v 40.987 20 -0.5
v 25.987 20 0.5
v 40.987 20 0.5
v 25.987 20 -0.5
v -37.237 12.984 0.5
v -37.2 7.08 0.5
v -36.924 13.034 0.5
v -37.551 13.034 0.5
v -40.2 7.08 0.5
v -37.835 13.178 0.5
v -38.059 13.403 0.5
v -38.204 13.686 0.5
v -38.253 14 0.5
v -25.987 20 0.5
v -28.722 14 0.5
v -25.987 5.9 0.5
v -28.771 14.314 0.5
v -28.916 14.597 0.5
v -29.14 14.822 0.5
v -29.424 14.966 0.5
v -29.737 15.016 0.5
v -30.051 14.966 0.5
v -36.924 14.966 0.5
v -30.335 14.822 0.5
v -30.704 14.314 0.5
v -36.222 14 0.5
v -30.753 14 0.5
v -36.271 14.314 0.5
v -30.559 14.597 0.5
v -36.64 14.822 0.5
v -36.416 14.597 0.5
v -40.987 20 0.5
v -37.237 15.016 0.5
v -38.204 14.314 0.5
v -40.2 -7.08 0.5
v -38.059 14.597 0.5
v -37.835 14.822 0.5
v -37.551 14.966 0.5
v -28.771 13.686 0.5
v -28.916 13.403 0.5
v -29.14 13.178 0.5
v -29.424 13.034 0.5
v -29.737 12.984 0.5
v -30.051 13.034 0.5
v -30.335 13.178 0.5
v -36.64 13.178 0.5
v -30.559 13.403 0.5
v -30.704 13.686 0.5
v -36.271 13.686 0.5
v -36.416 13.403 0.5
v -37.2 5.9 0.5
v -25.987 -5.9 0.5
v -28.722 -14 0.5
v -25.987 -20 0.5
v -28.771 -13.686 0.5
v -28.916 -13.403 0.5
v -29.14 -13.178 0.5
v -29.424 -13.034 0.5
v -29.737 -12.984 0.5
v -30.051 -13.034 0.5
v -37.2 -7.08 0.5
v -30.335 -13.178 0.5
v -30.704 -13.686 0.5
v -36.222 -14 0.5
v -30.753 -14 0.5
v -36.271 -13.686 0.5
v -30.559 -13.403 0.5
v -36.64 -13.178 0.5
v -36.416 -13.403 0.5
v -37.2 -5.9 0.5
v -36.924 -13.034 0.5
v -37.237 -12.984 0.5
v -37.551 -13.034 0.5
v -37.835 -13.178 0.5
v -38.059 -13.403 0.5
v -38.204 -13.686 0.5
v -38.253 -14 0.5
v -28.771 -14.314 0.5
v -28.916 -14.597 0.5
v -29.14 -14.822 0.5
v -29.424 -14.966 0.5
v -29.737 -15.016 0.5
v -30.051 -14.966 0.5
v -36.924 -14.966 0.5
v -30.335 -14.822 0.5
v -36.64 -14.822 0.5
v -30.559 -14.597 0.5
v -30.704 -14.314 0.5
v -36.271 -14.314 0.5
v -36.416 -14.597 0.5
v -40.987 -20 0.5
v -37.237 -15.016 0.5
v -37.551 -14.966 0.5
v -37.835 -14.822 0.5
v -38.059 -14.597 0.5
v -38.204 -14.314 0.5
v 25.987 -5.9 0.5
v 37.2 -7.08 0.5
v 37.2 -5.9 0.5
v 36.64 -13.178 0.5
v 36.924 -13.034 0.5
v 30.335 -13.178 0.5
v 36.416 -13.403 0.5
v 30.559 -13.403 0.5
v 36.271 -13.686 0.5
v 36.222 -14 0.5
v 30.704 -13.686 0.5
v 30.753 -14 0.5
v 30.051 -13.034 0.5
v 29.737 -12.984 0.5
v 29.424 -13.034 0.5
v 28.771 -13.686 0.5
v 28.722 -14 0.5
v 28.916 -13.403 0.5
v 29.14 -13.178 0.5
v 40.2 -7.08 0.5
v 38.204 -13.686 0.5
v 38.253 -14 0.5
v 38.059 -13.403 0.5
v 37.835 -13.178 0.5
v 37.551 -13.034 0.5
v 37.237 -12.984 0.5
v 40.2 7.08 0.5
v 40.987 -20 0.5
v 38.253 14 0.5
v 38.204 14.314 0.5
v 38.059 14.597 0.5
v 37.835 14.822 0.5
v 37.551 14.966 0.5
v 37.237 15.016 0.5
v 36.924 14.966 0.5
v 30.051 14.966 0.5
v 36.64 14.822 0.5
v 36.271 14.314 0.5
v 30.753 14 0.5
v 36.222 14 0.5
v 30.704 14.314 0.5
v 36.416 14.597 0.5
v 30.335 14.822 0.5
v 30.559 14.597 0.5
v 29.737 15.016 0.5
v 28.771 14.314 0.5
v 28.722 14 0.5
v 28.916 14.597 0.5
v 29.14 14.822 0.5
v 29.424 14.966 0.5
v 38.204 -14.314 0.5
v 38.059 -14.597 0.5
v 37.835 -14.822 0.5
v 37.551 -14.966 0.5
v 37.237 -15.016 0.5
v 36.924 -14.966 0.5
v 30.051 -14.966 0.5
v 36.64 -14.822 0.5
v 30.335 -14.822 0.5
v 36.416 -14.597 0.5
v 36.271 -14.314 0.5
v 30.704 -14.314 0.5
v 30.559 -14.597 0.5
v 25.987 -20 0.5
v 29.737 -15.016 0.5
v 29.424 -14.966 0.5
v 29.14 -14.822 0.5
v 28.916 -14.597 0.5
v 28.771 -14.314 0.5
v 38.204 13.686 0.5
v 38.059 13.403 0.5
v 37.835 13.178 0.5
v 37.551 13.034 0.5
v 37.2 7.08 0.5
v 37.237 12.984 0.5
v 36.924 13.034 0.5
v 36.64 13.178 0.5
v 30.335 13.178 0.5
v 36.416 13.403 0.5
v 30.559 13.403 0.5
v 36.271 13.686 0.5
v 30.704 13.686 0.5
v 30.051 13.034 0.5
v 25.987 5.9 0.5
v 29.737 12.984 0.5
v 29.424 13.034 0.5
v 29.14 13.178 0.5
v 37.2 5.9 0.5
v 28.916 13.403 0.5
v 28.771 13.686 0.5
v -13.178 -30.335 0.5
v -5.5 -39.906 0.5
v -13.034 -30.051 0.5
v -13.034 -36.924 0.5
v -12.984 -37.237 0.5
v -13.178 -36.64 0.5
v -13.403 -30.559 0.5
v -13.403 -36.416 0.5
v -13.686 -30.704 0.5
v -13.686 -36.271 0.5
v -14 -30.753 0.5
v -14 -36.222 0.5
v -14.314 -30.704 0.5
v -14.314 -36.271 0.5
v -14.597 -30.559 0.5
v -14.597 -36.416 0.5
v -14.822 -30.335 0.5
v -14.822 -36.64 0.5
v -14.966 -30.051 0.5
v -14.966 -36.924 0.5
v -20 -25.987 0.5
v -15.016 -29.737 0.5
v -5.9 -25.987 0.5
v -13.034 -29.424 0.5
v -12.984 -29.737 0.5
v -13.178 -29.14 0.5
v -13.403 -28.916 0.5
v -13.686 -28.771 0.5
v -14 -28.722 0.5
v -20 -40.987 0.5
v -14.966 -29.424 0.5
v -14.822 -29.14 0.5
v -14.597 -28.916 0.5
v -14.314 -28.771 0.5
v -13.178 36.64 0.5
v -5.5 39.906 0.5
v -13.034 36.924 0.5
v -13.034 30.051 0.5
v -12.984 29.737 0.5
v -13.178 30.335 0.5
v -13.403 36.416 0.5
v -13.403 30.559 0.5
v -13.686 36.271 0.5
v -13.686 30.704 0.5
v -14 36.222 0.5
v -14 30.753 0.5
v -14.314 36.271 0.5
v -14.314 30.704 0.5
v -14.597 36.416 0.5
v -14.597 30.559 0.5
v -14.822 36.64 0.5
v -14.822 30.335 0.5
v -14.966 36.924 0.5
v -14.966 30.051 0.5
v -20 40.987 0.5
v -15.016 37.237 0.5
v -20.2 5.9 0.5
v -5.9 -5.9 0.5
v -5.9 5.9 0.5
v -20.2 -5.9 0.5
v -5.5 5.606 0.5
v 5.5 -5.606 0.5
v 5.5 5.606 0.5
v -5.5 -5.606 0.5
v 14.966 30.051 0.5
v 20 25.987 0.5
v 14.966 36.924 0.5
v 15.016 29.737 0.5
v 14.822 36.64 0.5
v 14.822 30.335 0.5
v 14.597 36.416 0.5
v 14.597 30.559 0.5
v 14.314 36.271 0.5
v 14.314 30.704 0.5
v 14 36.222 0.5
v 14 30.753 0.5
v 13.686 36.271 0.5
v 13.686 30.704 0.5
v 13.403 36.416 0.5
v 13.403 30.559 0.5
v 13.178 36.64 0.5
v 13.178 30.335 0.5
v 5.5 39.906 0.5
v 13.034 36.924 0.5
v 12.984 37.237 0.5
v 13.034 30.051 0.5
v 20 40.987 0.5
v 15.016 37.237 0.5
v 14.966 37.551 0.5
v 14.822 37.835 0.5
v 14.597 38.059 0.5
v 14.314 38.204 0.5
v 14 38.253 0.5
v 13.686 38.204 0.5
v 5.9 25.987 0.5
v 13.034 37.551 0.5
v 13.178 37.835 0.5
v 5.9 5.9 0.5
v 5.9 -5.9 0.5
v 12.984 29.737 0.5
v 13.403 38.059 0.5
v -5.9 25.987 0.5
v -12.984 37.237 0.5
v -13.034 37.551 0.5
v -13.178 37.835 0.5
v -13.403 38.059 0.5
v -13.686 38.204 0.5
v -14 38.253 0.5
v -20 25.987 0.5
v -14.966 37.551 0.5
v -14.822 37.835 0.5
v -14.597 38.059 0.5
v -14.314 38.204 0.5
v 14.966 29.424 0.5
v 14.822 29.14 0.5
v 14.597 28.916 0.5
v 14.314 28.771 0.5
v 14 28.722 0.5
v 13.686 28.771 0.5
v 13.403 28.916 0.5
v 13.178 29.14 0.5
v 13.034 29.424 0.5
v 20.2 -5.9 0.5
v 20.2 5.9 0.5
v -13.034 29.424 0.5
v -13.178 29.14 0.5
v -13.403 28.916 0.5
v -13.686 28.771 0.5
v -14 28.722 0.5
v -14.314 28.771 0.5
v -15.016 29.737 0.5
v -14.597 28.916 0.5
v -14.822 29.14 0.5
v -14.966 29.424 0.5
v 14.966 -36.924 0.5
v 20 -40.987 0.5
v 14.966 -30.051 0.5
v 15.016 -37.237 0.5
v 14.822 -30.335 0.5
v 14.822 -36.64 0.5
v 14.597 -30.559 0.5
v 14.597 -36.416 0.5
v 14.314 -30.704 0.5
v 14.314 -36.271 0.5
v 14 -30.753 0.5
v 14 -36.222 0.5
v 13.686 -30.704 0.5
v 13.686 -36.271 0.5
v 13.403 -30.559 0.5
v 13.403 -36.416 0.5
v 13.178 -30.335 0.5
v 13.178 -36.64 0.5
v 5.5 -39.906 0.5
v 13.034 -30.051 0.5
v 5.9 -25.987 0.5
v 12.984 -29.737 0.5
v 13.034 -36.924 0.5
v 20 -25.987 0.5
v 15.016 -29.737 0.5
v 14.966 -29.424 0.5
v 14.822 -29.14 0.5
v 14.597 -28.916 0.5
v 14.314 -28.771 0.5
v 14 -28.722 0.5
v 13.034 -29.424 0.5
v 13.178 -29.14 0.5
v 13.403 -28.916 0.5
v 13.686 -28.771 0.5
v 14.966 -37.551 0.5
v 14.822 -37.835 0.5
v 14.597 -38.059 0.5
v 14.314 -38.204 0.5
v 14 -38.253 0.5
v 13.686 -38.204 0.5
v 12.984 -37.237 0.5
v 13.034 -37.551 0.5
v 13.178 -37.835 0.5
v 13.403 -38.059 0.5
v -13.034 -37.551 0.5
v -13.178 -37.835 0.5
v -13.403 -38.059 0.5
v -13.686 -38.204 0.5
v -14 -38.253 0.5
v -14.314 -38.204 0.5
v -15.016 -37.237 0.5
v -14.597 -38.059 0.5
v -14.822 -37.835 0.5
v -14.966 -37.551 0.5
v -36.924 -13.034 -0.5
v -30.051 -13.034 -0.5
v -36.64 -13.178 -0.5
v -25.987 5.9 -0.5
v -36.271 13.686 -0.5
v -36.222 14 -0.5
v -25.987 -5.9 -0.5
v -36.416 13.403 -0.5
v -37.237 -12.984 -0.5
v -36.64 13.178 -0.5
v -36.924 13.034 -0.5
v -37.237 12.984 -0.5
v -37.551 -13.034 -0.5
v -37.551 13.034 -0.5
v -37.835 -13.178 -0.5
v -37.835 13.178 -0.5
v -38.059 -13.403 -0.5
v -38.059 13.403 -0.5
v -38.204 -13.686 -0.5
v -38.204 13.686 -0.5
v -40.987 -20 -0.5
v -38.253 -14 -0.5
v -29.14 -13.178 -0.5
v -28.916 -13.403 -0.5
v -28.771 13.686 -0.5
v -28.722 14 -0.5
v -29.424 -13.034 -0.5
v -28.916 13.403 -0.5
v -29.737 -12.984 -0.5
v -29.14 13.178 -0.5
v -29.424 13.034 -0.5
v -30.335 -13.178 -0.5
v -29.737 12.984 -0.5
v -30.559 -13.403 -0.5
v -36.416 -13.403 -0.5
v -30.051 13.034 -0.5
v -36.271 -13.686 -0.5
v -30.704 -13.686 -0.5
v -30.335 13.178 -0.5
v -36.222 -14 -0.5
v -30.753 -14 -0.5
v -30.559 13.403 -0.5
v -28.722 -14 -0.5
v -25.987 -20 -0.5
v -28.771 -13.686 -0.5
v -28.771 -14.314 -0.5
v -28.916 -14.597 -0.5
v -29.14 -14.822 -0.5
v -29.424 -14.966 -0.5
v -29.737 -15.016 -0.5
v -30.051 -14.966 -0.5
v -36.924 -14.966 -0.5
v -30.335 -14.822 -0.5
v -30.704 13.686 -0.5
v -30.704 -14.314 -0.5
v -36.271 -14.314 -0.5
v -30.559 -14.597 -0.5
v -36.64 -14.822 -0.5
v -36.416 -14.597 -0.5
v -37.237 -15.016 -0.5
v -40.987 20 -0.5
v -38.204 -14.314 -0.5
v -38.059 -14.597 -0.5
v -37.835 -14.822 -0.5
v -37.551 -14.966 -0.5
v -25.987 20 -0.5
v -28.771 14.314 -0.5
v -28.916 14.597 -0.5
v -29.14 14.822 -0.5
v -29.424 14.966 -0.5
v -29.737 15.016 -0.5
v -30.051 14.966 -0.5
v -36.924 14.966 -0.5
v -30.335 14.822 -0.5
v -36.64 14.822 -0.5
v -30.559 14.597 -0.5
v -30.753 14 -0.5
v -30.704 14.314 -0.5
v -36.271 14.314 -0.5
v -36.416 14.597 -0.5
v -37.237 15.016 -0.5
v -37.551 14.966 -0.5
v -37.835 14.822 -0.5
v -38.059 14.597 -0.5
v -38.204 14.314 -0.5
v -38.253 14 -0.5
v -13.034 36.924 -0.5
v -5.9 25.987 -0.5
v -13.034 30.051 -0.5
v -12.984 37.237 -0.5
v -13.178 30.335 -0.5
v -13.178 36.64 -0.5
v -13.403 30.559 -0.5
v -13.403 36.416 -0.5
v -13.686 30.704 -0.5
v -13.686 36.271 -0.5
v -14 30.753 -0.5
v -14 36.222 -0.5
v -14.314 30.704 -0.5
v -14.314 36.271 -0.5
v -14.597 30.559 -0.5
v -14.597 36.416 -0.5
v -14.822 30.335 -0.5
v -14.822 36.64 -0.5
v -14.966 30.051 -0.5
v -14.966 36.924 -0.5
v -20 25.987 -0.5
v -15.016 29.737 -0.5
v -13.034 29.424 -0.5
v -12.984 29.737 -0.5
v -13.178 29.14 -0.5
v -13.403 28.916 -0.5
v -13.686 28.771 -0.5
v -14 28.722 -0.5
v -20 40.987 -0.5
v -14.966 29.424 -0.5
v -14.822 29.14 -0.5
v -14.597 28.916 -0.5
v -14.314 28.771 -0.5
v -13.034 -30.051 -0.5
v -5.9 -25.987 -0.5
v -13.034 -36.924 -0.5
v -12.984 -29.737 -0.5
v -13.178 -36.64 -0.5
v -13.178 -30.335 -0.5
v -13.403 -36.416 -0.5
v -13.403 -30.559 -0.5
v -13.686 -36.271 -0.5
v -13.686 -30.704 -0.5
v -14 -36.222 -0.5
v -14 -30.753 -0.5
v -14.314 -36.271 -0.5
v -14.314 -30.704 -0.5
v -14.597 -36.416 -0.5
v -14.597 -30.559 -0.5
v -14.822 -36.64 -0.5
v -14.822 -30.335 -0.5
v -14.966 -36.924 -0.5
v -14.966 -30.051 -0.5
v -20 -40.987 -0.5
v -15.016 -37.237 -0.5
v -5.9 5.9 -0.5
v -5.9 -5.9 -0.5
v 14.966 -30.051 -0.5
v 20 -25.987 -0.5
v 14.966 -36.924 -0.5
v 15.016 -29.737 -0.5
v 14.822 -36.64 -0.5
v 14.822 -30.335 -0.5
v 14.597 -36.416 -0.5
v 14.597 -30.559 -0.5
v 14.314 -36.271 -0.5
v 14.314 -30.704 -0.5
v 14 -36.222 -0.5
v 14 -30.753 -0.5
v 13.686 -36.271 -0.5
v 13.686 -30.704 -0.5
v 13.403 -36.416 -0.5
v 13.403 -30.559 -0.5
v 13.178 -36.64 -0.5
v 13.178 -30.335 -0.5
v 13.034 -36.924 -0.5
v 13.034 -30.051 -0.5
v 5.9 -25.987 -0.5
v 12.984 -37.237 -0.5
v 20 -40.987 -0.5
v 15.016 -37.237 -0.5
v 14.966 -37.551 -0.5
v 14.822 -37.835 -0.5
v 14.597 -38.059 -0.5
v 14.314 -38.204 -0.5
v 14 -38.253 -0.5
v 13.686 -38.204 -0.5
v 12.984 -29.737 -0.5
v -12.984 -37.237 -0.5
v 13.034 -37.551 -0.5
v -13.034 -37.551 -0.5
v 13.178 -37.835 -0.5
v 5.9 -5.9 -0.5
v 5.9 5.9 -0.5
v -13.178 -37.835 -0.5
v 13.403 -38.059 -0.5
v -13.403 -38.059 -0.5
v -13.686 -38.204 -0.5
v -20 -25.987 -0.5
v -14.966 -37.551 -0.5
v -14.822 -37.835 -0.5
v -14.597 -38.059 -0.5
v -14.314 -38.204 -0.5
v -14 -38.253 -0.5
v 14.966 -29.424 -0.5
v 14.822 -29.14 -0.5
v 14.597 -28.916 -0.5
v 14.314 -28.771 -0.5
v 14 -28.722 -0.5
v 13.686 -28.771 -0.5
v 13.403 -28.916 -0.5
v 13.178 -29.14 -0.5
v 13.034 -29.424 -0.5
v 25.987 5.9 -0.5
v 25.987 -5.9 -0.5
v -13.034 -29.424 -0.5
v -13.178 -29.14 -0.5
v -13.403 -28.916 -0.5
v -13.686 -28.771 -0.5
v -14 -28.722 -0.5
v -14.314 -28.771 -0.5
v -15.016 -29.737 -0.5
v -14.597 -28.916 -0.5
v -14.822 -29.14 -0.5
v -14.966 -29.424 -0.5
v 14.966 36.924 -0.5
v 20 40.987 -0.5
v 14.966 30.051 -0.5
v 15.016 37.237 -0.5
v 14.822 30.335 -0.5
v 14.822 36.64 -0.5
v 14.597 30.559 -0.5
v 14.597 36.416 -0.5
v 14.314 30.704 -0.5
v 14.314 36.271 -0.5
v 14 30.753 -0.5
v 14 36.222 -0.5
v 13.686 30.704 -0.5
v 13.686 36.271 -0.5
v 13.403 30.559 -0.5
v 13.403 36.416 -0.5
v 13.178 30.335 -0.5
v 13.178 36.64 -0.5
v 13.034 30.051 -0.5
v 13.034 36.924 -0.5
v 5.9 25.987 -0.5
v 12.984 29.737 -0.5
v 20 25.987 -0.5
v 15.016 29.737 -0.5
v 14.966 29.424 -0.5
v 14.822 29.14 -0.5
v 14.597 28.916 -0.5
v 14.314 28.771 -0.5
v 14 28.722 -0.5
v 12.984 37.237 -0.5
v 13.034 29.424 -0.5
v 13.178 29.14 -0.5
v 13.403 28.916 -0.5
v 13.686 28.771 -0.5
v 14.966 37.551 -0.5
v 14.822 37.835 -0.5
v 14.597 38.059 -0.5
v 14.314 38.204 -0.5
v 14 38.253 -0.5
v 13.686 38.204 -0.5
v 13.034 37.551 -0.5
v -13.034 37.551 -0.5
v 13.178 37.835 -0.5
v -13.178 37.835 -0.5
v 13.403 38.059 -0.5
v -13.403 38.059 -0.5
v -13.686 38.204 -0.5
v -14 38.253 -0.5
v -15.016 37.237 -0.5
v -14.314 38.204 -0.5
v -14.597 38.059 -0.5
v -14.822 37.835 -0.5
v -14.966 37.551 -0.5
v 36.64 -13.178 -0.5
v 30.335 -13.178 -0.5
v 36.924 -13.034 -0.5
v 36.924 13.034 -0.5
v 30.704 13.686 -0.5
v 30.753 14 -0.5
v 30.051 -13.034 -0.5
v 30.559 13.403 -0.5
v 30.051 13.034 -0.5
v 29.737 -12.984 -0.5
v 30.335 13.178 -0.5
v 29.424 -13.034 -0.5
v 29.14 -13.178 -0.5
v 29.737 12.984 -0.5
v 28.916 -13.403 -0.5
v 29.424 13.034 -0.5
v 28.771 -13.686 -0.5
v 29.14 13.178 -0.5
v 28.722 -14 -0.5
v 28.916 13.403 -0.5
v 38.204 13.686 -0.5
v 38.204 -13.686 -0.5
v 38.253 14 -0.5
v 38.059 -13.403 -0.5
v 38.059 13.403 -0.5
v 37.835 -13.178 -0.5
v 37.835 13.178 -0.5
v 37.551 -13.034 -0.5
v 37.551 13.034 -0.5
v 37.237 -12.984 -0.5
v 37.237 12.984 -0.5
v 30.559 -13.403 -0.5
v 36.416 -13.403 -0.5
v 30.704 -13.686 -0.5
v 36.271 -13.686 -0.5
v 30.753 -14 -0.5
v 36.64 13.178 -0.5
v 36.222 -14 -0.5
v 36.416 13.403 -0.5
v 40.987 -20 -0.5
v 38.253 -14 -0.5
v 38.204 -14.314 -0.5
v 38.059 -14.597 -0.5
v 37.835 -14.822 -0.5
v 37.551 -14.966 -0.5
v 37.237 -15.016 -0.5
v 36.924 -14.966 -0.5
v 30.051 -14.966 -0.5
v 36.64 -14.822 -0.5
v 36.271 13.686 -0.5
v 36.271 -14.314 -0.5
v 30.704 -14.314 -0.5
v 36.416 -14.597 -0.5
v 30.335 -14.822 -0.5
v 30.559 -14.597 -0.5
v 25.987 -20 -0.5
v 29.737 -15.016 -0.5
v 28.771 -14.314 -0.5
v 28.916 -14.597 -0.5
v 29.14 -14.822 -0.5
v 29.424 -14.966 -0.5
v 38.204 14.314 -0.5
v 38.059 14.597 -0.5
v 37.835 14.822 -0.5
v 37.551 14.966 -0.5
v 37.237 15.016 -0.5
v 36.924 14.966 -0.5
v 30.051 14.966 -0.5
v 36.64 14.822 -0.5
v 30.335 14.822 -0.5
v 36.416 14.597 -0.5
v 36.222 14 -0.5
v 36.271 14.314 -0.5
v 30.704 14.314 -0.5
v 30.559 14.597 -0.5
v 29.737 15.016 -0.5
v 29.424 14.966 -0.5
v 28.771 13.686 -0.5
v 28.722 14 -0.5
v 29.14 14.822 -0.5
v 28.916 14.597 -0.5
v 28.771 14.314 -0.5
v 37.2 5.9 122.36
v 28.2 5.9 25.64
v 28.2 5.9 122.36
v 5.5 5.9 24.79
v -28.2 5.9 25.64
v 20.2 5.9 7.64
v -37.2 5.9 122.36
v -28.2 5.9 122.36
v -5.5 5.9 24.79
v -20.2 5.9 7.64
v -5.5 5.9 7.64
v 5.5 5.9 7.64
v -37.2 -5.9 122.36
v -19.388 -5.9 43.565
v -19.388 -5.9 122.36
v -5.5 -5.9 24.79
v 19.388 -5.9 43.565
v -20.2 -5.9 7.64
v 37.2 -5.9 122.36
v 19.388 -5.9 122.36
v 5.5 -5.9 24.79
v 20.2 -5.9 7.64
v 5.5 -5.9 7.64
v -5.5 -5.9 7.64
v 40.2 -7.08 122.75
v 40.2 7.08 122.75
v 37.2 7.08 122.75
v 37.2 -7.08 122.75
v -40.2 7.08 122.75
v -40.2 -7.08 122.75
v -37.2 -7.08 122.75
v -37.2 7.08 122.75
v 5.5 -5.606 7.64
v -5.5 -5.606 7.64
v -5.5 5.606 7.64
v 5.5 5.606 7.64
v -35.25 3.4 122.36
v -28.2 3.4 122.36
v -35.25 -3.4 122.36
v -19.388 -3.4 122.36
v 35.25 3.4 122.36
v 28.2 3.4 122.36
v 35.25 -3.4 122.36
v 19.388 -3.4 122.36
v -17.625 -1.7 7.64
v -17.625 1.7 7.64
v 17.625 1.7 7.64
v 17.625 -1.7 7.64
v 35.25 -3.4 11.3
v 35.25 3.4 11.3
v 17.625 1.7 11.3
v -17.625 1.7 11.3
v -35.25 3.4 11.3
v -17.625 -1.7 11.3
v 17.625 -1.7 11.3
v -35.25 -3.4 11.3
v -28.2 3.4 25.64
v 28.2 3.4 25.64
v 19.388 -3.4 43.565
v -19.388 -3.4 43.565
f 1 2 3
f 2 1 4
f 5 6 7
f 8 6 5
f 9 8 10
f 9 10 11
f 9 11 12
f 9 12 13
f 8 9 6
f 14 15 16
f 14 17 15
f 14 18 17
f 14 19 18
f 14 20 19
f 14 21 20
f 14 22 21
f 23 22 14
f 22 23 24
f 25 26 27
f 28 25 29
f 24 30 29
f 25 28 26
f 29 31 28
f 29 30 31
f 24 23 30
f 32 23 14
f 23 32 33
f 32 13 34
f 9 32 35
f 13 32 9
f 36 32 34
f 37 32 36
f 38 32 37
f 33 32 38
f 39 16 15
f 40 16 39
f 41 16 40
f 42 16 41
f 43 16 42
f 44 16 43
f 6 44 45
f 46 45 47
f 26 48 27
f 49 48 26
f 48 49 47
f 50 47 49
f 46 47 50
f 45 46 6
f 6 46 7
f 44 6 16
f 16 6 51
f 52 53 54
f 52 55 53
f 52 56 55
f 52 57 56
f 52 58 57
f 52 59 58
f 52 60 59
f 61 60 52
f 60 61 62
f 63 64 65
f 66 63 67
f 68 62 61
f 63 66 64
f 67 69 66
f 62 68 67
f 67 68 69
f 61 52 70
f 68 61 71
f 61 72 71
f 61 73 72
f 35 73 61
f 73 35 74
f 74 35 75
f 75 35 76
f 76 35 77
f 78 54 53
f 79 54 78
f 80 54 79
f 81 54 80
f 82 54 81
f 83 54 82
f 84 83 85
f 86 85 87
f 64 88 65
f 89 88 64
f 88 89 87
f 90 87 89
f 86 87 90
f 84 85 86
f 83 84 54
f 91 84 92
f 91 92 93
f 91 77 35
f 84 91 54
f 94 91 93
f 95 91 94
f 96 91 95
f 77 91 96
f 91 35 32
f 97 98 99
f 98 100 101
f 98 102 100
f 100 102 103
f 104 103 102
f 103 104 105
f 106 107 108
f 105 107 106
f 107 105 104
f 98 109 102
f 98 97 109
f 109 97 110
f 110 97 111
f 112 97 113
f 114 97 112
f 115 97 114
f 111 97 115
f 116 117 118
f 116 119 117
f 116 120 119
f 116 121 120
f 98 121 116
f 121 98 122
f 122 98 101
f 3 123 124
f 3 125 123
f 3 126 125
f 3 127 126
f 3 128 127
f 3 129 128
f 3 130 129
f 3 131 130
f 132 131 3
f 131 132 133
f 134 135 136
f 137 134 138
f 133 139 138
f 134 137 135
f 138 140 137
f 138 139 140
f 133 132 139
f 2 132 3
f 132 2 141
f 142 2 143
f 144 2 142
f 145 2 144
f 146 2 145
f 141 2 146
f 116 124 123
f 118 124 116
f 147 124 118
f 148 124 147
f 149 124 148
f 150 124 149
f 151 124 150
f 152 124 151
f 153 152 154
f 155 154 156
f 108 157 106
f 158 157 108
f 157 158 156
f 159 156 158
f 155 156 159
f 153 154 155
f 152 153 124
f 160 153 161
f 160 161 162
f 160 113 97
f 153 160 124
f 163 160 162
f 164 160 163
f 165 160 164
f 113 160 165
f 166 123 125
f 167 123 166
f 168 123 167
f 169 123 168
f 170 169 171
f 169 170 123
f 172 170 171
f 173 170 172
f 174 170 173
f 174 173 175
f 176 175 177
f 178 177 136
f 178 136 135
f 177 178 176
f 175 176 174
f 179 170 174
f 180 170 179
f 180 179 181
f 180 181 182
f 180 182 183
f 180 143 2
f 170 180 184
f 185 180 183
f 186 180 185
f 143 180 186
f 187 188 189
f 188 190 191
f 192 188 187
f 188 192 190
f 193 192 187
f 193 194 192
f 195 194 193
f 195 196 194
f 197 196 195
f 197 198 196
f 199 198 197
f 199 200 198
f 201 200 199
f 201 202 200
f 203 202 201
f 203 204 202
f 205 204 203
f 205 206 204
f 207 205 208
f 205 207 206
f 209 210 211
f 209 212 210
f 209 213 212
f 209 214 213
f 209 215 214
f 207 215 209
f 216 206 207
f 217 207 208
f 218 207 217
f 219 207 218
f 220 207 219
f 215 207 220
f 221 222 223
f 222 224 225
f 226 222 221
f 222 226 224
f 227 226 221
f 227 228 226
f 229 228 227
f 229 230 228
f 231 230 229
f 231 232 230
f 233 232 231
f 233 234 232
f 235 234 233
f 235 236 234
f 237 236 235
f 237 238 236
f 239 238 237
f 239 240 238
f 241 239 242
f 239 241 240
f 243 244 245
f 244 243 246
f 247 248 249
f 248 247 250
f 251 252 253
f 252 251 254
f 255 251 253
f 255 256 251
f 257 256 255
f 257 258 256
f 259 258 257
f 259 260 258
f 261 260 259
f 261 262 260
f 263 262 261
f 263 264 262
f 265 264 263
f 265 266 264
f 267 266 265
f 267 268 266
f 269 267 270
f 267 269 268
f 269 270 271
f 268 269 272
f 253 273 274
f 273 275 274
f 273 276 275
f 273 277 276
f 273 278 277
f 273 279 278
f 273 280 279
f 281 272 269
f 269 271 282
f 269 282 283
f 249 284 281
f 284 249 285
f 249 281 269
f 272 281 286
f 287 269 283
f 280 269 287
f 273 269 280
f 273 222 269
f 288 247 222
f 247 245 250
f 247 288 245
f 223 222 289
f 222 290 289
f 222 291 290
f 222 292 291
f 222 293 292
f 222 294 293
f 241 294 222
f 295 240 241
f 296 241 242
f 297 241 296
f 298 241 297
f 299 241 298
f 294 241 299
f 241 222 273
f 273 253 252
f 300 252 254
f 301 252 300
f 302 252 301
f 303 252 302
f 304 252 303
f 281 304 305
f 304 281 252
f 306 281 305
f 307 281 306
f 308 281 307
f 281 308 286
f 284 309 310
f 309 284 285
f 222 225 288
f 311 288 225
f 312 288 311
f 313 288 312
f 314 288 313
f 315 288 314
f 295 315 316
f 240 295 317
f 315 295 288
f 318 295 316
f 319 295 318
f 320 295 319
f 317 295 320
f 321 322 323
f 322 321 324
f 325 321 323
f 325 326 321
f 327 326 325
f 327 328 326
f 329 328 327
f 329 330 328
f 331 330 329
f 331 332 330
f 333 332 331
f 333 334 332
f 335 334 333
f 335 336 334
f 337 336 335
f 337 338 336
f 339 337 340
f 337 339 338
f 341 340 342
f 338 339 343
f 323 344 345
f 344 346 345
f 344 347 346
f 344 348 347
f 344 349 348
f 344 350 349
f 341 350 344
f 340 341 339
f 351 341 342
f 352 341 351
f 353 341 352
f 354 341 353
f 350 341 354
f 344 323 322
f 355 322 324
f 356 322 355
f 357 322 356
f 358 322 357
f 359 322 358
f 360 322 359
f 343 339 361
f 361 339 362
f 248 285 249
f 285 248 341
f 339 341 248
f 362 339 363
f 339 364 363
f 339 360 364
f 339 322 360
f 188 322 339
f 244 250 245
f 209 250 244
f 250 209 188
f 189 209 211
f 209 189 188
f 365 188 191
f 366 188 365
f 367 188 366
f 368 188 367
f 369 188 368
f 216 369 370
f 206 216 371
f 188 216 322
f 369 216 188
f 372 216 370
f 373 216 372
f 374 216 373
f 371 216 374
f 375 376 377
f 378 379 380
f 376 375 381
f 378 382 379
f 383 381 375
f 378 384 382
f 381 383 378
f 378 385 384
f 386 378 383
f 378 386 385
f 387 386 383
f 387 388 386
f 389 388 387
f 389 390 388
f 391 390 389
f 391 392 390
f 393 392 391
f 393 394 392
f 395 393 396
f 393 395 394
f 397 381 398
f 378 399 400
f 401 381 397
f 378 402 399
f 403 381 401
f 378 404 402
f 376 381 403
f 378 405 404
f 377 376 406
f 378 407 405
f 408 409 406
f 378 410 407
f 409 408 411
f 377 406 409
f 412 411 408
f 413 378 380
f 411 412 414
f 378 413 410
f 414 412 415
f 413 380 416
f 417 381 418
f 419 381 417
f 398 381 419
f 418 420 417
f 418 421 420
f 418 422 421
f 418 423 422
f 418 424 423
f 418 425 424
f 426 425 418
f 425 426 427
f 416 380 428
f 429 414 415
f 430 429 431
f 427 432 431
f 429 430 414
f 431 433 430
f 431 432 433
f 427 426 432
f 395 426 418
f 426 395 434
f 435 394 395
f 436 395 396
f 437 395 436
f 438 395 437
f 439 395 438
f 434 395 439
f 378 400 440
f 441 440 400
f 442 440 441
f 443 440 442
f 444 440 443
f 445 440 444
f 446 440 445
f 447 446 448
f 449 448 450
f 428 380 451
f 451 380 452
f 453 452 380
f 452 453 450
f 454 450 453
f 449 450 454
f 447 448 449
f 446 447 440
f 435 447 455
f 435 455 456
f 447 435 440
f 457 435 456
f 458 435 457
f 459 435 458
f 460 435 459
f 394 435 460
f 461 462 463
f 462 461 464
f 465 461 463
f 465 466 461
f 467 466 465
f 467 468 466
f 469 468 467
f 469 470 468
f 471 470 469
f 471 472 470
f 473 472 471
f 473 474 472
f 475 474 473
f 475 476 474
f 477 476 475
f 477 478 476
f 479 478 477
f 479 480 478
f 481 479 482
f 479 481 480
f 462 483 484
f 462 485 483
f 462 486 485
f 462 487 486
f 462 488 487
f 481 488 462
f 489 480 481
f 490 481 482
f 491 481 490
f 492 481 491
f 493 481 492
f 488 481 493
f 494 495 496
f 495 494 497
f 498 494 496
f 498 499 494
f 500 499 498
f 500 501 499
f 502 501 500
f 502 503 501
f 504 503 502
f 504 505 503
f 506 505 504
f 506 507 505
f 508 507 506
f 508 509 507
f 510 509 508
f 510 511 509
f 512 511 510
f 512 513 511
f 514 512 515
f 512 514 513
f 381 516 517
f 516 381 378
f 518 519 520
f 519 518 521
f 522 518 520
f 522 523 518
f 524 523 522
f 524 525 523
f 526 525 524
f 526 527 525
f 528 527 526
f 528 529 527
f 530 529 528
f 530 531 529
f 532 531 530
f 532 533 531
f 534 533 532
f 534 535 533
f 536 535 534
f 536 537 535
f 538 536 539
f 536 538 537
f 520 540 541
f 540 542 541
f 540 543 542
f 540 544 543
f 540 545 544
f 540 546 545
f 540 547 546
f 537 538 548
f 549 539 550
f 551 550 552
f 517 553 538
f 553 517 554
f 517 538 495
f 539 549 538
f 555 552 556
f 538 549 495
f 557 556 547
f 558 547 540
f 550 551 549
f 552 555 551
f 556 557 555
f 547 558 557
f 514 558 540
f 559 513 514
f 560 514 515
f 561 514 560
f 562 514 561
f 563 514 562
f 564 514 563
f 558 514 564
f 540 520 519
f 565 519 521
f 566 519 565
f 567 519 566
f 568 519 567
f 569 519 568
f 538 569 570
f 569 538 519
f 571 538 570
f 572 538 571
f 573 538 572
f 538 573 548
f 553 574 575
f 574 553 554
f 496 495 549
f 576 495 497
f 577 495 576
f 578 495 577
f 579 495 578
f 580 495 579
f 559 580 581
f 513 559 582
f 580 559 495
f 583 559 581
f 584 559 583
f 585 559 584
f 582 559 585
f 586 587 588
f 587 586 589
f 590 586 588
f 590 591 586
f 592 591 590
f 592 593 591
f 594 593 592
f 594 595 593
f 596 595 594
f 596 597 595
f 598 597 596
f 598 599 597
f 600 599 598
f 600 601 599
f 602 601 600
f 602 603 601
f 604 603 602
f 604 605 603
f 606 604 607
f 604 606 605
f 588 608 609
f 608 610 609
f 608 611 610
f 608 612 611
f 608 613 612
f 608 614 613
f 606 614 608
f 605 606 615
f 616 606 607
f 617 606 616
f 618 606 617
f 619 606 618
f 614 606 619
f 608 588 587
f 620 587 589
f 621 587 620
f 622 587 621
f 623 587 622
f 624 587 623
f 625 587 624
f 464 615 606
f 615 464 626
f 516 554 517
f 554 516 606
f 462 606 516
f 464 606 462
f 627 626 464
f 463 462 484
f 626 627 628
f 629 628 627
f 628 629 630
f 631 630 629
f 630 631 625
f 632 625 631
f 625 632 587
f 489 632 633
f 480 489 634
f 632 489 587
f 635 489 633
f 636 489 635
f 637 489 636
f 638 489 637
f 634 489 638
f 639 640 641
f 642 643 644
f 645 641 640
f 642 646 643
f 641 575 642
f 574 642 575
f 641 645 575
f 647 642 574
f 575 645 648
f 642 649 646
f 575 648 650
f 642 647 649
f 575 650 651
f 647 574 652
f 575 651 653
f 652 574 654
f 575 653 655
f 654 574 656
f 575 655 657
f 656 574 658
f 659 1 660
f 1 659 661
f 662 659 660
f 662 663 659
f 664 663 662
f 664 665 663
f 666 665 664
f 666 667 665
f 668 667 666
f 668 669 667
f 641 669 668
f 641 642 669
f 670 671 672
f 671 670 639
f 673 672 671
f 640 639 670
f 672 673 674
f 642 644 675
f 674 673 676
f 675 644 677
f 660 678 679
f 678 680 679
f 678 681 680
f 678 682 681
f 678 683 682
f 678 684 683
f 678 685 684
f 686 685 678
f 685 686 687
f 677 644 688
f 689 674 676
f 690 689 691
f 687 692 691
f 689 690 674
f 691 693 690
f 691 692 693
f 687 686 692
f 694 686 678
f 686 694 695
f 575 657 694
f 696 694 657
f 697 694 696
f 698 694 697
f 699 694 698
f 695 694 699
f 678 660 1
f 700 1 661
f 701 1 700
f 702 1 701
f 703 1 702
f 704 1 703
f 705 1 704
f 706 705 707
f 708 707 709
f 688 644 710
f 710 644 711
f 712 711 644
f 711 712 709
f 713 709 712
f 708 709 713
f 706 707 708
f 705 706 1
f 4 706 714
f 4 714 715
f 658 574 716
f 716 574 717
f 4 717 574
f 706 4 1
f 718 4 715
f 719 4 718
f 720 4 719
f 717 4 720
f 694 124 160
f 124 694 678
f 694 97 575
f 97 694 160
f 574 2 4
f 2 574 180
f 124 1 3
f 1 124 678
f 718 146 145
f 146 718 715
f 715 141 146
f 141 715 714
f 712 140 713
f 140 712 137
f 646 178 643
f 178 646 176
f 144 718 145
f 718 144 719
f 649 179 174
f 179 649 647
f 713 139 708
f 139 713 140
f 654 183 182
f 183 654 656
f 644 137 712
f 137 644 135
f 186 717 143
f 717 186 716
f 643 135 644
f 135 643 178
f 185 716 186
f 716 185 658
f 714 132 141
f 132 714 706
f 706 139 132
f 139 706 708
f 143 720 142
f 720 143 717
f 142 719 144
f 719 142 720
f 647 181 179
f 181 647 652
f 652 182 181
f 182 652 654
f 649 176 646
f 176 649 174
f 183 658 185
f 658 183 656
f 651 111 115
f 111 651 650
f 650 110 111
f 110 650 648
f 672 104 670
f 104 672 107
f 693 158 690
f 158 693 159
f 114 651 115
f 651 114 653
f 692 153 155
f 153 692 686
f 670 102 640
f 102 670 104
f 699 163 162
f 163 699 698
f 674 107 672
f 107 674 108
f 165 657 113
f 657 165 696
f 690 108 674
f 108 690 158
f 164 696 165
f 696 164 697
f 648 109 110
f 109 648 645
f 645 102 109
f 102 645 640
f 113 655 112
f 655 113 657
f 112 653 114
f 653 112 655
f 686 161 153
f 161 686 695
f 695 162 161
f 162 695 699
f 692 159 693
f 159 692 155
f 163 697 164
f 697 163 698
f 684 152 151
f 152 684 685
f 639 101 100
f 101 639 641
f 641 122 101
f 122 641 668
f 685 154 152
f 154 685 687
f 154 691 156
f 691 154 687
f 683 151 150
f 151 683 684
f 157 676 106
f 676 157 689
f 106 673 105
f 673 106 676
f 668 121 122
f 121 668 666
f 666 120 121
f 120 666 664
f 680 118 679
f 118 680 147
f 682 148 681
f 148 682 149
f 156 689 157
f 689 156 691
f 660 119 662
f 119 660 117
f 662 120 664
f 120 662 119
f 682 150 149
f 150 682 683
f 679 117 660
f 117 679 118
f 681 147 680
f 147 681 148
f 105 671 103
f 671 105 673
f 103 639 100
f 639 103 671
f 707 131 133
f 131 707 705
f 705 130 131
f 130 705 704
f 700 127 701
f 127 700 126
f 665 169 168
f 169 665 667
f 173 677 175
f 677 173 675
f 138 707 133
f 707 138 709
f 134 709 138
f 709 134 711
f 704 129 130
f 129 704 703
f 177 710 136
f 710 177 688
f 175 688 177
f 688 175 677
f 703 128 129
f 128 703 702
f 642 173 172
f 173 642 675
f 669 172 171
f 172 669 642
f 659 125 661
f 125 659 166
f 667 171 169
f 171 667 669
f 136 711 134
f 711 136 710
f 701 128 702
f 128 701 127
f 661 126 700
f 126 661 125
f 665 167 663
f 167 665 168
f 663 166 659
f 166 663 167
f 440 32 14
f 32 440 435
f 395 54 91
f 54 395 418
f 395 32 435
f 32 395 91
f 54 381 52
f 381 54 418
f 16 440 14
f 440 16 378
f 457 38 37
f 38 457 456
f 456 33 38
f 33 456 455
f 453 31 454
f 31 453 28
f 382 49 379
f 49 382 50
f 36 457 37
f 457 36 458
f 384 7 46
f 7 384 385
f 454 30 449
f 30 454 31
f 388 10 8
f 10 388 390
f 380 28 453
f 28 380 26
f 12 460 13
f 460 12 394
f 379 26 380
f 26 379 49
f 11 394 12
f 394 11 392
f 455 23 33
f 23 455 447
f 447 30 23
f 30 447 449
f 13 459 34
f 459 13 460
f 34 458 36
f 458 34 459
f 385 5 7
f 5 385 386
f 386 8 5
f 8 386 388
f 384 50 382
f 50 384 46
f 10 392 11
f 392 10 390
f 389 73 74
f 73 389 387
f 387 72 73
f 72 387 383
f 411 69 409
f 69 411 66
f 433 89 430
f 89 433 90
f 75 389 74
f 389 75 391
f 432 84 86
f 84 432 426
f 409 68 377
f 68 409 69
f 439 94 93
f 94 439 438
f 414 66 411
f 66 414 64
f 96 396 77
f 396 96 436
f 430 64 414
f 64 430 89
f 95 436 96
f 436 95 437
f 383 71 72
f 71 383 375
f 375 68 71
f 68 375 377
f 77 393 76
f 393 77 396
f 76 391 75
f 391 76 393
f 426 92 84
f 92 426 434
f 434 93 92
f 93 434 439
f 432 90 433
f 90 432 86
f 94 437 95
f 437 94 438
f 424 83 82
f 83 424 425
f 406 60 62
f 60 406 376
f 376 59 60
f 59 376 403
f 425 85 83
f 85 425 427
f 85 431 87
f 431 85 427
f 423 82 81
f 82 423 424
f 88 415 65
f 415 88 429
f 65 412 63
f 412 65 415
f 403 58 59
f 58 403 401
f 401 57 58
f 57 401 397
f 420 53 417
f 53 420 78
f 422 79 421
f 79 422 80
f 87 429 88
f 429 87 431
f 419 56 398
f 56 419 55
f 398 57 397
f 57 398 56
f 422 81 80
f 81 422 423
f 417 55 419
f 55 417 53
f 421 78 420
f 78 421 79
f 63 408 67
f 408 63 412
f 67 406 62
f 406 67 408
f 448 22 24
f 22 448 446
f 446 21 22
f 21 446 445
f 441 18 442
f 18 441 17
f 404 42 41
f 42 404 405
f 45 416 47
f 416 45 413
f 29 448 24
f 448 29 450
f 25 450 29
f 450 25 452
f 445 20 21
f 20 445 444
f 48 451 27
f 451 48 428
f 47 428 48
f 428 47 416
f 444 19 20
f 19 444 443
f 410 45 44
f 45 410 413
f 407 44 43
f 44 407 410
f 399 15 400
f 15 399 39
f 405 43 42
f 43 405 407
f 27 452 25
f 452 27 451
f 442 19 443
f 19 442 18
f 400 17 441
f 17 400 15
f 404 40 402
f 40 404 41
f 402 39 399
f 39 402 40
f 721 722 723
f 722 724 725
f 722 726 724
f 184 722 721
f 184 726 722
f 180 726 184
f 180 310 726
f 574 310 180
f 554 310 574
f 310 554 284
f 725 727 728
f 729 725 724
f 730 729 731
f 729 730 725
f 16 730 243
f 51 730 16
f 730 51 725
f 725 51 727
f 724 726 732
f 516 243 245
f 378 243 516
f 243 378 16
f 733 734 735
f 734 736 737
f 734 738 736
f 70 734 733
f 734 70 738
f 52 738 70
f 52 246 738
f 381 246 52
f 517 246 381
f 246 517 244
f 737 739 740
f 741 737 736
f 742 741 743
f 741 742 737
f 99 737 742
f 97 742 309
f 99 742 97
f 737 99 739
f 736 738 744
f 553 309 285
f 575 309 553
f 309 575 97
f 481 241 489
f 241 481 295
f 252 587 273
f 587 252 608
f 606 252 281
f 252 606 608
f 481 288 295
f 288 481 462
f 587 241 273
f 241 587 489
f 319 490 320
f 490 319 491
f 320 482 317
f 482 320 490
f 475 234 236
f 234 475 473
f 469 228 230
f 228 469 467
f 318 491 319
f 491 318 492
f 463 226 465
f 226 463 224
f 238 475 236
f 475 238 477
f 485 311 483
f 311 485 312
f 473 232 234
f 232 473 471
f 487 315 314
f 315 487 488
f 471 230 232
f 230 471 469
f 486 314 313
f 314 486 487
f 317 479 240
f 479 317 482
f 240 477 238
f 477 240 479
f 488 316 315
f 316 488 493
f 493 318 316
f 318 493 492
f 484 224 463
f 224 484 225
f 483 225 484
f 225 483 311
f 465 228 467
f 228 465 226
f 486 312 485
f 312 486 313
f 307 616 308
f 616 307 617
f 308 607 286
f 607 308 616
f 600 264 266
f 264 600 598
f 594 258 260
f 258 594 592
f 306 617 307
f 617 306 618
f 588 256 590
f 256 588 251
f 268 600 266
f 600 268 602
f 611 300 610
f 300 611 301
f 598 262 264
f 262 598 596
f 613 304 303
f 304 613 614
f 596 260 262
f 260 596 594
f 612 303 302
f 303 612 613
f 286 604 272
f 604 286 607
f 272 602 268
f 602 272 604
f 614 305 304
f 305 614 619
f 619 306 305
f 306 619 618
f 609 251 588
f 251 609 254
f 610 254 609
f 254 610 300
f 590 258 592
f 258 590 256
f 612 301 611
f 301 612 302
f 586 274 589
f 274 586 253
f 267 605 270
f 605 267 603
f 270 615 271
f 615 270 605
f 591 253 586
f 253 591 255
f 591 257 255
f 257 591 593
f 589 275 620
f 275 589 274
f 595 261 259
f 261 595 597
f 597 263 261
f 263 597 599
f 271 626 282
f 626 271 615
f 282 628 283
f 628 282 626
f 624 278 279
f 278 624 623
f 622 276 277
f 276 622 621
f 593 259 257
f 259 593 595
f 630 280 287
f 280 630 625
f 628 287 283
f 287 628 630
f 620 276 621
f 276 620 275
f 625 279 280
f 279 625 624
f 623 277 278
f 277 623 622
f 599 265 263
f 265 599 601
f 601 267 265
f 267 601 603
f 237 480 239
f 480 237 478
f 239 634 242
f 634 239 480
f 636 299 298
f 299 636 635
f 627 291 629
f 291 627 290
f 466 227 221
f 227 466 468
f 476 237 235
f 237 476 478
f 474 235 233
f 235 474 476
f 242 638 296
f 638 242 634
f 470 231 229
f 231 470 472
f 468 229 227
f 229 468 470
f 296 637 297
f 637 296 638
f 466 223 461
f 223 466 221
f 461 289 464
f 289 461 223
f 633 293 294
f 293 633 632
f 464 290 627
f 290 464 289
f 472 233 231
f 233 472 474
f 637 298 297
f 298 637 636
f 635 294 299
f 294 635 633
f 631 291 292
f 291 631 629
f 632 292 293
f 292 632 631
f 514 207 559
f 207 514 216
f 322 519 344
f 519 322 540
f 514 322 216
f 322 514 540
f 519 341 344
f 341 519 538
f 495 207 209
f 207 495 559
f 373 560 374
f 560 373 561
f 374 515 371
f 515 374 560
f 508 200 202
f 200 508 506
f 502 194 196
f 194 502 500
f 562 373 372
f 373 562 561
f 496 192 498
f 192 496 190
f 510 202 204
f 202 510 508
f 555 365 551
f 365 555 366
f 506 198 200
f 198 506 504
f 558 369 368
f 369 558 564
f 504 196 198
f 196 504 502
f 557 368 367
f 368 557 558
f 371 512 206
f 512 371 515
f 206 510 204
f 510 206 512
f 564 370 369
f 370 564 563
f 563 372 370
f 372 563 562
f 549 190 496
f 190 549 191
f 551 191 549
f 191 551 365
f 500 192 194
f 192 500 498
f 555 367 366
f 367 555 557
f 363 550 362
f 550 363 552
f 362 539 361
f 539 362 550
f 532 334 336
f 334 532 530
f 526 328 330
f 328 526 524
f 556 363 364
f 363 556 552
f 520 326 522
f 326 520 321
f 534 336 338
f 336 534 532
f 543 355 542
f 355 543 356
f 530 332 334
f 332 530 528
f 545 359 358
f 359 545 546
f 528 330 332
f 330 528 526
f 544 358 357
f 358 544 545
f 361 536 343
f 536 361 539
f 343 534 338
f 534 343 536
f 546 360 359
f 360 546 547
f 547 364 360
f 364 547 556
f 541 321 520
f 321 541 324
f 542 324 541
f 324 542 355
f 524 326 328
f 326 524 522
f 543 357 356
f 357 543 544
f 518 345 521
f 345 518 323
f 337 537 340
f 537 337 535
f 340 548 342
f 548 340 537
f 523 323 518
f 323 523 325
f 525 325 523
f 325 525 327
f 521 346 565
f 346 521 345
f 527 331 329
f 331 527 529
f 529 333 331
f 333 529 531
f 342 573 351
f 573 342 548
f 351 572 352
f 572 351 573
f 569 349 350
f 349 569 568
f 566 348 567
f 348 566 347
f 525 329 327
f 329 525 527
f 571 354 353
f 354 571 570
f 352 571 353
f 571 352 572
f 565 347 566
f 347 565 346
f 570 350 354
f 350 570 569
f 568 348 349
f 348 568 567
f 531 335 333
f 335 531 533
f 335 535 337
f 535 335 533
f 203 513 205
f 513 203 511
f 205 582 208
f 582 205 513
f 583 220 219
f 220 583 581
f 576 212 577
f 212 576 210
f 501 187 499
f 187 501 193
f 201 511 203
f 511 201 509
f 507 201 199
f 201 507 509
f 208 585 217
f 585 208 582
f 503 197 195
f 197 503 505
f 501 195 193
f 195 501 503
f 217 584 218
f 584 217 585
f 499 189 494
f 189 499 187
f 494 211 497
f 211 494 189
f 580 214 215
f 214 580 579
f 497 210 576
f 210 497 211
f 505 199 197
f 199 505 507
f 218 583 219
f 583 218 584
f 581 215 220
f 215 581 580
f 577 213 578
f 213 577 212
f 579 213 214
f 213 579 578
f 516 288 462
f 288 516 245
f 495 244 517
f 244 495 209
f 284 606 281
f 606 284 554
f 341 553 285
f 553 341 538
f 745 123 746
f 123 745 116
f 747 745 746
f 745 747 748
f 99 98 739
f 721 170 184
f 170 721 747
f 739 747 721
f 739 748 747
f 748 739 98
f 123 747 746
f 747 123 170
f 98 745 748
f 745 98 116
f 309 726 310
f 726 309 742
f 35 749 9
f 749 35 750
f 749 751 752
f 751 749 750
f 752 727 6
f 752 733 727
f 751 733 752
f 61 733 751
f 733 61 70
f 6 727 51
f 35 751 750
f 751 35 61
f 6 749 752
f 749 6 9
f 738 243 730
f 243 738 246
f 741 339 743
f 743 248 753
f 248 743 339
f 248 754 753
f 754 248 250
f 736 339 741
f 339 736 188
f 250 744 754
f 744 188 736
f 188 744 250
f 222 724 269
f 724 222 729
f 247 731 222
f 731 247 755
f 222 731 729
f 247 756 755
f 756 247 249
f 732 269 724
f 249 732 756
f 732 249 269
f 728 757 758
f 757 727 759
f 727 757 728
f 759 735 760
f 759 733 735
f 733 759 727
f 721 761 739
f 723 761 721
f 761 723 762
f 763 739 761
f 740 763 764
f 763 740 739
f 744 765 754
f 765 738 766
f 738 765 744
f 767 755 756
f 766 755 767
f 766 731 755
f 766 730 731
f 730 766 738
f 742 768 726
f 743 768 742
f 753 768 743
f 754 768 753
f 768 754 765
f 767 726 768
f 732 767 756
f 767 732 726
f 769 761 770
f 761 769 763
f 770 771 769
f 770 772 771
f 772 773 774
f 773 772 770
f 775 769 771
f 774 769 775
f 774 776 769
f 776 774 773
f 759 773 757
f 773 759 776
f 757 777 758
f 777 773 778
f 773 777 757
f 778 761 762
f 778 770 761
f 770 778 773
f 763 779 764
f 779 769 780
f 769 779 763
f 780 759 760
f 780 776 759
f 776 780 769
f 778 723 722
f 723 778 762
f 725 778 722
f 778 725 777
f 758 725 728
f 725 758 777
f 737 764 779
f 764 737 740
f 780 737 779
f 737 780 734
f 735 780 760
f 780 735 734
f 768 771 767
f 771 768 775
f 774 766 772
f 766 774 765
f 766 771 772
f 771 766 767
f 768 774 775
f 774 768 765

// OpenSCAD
width = 40;
height = 15;
screw_offset_x = .35 * width;
screw_offset_y = .25 * height;
screw_radius = 1.016;
screw_height = 3;
res=20;

phone_width = 70.5;
phone_depth = 6.8;
phone_height = 143.4;

casing_wiggle = 5;
casing_depth = phone_depth + casing_wiggle; 
casing_width = phone_width + casing_wiggle; 
casing_height = phone_height * .8;

screw_mount_placement =  ( .95 * phone_width ) / 2;




union() {
    rotate(90) 
    BaseStation();
    BaseStation();
    Support();
    rotate(180)
    Support();
    
    translate( [.8*casing_width/2,0,0] ) 
    HorizontalSupport();
    translate( [-.8*casing_width/2,0,0] )
    rotate(180)
    HorizontalSupport();
}

translate( [0,0, 65 ] ) {  
    DrawCase();  
}
//translate( [0,0,80] )
//DrawPhone();

// Tringular Support
module Support( l=11,w=35,h=25) {
    translate( [ 0,  -.69 * screw_mount_placement, 0 ] )
    prism(l,w,h);
}

module VerticalSupport( height=1 ) {
    width = casing_depth * 1.2;
    translate( [7,width/-2,0] )
    cube( [3,width,height]);
}

module HorizontalSupport(height=10) {
    VerticalSupport(casing_height*1.07);
    translate([0,0,height/2])
    cube([20,casing_depth ,height], center=true);
}

module BaseStation() {
    union () {
    cube( [screw_mount_placement * 2, casing_depth, 1] , center=true);
    ScrewMount( screw_mount_placement,0,0);
    ScrewMount( -1 * screw_mount_placement,0,0);
    }
}


module DrawPhone( v = [0,0,0], s=1) {
        translate(v)
        cube( [s*phone_width , s*phone_depth, s*phone_height ], center = true );
}

module DrawCase() {
        y_off = 18;
        difference() {
            rotate(90)
            cube( [ casing_depth, casing_width, casing_height  ], center = true );
            DrawPhone([0,0,y_off]);
            DrawPhone([0,5,y_off], s=.8);
            DrawPhone([0,-5,y_off], s=.55);
            DrawPhone([0,0,-30], s=.5);
            
        }
        
}

module Screw(x,y,z) {
    translate( [x,y,z] )
    cylinder( screw_height, screw_radius, screw_radius, $fn=res, center = true );
}


module ScrewMount(x,y,z) {
    translate( [x,y,z] )
    rotate( 90 ) // Rotate for placement
    // Subtract screw holes from base
    difference()  {
        // Draw base
        cube( [width,height,1], center = true );
        // Draw screw holes
        Screw(screw_offset_x, screw_offset_y, 0);
        Screw(-1 * screw_offset_x, screw_offset_y, 0);
        Screw(-1 * screw_offset_x, -1 * screw_offset_y, 0);
        Screw(screw_offset_x, -1 * screw_offset_y, 0);
    
    }
}


module prism(l, w, h){
       translate([ -1 * l/2, -1 *  w/2,0])
       polyhedron(
               points=[[0,0,0], [l,0,0], [l,w,0], [0,w,0], [0,w,h], [l,w,h]],
               faces=[[0,1,2,3],[5,4,3,2],[0,4,5,1],[0,3,4],[5,2,1]]
               );
       

 }
